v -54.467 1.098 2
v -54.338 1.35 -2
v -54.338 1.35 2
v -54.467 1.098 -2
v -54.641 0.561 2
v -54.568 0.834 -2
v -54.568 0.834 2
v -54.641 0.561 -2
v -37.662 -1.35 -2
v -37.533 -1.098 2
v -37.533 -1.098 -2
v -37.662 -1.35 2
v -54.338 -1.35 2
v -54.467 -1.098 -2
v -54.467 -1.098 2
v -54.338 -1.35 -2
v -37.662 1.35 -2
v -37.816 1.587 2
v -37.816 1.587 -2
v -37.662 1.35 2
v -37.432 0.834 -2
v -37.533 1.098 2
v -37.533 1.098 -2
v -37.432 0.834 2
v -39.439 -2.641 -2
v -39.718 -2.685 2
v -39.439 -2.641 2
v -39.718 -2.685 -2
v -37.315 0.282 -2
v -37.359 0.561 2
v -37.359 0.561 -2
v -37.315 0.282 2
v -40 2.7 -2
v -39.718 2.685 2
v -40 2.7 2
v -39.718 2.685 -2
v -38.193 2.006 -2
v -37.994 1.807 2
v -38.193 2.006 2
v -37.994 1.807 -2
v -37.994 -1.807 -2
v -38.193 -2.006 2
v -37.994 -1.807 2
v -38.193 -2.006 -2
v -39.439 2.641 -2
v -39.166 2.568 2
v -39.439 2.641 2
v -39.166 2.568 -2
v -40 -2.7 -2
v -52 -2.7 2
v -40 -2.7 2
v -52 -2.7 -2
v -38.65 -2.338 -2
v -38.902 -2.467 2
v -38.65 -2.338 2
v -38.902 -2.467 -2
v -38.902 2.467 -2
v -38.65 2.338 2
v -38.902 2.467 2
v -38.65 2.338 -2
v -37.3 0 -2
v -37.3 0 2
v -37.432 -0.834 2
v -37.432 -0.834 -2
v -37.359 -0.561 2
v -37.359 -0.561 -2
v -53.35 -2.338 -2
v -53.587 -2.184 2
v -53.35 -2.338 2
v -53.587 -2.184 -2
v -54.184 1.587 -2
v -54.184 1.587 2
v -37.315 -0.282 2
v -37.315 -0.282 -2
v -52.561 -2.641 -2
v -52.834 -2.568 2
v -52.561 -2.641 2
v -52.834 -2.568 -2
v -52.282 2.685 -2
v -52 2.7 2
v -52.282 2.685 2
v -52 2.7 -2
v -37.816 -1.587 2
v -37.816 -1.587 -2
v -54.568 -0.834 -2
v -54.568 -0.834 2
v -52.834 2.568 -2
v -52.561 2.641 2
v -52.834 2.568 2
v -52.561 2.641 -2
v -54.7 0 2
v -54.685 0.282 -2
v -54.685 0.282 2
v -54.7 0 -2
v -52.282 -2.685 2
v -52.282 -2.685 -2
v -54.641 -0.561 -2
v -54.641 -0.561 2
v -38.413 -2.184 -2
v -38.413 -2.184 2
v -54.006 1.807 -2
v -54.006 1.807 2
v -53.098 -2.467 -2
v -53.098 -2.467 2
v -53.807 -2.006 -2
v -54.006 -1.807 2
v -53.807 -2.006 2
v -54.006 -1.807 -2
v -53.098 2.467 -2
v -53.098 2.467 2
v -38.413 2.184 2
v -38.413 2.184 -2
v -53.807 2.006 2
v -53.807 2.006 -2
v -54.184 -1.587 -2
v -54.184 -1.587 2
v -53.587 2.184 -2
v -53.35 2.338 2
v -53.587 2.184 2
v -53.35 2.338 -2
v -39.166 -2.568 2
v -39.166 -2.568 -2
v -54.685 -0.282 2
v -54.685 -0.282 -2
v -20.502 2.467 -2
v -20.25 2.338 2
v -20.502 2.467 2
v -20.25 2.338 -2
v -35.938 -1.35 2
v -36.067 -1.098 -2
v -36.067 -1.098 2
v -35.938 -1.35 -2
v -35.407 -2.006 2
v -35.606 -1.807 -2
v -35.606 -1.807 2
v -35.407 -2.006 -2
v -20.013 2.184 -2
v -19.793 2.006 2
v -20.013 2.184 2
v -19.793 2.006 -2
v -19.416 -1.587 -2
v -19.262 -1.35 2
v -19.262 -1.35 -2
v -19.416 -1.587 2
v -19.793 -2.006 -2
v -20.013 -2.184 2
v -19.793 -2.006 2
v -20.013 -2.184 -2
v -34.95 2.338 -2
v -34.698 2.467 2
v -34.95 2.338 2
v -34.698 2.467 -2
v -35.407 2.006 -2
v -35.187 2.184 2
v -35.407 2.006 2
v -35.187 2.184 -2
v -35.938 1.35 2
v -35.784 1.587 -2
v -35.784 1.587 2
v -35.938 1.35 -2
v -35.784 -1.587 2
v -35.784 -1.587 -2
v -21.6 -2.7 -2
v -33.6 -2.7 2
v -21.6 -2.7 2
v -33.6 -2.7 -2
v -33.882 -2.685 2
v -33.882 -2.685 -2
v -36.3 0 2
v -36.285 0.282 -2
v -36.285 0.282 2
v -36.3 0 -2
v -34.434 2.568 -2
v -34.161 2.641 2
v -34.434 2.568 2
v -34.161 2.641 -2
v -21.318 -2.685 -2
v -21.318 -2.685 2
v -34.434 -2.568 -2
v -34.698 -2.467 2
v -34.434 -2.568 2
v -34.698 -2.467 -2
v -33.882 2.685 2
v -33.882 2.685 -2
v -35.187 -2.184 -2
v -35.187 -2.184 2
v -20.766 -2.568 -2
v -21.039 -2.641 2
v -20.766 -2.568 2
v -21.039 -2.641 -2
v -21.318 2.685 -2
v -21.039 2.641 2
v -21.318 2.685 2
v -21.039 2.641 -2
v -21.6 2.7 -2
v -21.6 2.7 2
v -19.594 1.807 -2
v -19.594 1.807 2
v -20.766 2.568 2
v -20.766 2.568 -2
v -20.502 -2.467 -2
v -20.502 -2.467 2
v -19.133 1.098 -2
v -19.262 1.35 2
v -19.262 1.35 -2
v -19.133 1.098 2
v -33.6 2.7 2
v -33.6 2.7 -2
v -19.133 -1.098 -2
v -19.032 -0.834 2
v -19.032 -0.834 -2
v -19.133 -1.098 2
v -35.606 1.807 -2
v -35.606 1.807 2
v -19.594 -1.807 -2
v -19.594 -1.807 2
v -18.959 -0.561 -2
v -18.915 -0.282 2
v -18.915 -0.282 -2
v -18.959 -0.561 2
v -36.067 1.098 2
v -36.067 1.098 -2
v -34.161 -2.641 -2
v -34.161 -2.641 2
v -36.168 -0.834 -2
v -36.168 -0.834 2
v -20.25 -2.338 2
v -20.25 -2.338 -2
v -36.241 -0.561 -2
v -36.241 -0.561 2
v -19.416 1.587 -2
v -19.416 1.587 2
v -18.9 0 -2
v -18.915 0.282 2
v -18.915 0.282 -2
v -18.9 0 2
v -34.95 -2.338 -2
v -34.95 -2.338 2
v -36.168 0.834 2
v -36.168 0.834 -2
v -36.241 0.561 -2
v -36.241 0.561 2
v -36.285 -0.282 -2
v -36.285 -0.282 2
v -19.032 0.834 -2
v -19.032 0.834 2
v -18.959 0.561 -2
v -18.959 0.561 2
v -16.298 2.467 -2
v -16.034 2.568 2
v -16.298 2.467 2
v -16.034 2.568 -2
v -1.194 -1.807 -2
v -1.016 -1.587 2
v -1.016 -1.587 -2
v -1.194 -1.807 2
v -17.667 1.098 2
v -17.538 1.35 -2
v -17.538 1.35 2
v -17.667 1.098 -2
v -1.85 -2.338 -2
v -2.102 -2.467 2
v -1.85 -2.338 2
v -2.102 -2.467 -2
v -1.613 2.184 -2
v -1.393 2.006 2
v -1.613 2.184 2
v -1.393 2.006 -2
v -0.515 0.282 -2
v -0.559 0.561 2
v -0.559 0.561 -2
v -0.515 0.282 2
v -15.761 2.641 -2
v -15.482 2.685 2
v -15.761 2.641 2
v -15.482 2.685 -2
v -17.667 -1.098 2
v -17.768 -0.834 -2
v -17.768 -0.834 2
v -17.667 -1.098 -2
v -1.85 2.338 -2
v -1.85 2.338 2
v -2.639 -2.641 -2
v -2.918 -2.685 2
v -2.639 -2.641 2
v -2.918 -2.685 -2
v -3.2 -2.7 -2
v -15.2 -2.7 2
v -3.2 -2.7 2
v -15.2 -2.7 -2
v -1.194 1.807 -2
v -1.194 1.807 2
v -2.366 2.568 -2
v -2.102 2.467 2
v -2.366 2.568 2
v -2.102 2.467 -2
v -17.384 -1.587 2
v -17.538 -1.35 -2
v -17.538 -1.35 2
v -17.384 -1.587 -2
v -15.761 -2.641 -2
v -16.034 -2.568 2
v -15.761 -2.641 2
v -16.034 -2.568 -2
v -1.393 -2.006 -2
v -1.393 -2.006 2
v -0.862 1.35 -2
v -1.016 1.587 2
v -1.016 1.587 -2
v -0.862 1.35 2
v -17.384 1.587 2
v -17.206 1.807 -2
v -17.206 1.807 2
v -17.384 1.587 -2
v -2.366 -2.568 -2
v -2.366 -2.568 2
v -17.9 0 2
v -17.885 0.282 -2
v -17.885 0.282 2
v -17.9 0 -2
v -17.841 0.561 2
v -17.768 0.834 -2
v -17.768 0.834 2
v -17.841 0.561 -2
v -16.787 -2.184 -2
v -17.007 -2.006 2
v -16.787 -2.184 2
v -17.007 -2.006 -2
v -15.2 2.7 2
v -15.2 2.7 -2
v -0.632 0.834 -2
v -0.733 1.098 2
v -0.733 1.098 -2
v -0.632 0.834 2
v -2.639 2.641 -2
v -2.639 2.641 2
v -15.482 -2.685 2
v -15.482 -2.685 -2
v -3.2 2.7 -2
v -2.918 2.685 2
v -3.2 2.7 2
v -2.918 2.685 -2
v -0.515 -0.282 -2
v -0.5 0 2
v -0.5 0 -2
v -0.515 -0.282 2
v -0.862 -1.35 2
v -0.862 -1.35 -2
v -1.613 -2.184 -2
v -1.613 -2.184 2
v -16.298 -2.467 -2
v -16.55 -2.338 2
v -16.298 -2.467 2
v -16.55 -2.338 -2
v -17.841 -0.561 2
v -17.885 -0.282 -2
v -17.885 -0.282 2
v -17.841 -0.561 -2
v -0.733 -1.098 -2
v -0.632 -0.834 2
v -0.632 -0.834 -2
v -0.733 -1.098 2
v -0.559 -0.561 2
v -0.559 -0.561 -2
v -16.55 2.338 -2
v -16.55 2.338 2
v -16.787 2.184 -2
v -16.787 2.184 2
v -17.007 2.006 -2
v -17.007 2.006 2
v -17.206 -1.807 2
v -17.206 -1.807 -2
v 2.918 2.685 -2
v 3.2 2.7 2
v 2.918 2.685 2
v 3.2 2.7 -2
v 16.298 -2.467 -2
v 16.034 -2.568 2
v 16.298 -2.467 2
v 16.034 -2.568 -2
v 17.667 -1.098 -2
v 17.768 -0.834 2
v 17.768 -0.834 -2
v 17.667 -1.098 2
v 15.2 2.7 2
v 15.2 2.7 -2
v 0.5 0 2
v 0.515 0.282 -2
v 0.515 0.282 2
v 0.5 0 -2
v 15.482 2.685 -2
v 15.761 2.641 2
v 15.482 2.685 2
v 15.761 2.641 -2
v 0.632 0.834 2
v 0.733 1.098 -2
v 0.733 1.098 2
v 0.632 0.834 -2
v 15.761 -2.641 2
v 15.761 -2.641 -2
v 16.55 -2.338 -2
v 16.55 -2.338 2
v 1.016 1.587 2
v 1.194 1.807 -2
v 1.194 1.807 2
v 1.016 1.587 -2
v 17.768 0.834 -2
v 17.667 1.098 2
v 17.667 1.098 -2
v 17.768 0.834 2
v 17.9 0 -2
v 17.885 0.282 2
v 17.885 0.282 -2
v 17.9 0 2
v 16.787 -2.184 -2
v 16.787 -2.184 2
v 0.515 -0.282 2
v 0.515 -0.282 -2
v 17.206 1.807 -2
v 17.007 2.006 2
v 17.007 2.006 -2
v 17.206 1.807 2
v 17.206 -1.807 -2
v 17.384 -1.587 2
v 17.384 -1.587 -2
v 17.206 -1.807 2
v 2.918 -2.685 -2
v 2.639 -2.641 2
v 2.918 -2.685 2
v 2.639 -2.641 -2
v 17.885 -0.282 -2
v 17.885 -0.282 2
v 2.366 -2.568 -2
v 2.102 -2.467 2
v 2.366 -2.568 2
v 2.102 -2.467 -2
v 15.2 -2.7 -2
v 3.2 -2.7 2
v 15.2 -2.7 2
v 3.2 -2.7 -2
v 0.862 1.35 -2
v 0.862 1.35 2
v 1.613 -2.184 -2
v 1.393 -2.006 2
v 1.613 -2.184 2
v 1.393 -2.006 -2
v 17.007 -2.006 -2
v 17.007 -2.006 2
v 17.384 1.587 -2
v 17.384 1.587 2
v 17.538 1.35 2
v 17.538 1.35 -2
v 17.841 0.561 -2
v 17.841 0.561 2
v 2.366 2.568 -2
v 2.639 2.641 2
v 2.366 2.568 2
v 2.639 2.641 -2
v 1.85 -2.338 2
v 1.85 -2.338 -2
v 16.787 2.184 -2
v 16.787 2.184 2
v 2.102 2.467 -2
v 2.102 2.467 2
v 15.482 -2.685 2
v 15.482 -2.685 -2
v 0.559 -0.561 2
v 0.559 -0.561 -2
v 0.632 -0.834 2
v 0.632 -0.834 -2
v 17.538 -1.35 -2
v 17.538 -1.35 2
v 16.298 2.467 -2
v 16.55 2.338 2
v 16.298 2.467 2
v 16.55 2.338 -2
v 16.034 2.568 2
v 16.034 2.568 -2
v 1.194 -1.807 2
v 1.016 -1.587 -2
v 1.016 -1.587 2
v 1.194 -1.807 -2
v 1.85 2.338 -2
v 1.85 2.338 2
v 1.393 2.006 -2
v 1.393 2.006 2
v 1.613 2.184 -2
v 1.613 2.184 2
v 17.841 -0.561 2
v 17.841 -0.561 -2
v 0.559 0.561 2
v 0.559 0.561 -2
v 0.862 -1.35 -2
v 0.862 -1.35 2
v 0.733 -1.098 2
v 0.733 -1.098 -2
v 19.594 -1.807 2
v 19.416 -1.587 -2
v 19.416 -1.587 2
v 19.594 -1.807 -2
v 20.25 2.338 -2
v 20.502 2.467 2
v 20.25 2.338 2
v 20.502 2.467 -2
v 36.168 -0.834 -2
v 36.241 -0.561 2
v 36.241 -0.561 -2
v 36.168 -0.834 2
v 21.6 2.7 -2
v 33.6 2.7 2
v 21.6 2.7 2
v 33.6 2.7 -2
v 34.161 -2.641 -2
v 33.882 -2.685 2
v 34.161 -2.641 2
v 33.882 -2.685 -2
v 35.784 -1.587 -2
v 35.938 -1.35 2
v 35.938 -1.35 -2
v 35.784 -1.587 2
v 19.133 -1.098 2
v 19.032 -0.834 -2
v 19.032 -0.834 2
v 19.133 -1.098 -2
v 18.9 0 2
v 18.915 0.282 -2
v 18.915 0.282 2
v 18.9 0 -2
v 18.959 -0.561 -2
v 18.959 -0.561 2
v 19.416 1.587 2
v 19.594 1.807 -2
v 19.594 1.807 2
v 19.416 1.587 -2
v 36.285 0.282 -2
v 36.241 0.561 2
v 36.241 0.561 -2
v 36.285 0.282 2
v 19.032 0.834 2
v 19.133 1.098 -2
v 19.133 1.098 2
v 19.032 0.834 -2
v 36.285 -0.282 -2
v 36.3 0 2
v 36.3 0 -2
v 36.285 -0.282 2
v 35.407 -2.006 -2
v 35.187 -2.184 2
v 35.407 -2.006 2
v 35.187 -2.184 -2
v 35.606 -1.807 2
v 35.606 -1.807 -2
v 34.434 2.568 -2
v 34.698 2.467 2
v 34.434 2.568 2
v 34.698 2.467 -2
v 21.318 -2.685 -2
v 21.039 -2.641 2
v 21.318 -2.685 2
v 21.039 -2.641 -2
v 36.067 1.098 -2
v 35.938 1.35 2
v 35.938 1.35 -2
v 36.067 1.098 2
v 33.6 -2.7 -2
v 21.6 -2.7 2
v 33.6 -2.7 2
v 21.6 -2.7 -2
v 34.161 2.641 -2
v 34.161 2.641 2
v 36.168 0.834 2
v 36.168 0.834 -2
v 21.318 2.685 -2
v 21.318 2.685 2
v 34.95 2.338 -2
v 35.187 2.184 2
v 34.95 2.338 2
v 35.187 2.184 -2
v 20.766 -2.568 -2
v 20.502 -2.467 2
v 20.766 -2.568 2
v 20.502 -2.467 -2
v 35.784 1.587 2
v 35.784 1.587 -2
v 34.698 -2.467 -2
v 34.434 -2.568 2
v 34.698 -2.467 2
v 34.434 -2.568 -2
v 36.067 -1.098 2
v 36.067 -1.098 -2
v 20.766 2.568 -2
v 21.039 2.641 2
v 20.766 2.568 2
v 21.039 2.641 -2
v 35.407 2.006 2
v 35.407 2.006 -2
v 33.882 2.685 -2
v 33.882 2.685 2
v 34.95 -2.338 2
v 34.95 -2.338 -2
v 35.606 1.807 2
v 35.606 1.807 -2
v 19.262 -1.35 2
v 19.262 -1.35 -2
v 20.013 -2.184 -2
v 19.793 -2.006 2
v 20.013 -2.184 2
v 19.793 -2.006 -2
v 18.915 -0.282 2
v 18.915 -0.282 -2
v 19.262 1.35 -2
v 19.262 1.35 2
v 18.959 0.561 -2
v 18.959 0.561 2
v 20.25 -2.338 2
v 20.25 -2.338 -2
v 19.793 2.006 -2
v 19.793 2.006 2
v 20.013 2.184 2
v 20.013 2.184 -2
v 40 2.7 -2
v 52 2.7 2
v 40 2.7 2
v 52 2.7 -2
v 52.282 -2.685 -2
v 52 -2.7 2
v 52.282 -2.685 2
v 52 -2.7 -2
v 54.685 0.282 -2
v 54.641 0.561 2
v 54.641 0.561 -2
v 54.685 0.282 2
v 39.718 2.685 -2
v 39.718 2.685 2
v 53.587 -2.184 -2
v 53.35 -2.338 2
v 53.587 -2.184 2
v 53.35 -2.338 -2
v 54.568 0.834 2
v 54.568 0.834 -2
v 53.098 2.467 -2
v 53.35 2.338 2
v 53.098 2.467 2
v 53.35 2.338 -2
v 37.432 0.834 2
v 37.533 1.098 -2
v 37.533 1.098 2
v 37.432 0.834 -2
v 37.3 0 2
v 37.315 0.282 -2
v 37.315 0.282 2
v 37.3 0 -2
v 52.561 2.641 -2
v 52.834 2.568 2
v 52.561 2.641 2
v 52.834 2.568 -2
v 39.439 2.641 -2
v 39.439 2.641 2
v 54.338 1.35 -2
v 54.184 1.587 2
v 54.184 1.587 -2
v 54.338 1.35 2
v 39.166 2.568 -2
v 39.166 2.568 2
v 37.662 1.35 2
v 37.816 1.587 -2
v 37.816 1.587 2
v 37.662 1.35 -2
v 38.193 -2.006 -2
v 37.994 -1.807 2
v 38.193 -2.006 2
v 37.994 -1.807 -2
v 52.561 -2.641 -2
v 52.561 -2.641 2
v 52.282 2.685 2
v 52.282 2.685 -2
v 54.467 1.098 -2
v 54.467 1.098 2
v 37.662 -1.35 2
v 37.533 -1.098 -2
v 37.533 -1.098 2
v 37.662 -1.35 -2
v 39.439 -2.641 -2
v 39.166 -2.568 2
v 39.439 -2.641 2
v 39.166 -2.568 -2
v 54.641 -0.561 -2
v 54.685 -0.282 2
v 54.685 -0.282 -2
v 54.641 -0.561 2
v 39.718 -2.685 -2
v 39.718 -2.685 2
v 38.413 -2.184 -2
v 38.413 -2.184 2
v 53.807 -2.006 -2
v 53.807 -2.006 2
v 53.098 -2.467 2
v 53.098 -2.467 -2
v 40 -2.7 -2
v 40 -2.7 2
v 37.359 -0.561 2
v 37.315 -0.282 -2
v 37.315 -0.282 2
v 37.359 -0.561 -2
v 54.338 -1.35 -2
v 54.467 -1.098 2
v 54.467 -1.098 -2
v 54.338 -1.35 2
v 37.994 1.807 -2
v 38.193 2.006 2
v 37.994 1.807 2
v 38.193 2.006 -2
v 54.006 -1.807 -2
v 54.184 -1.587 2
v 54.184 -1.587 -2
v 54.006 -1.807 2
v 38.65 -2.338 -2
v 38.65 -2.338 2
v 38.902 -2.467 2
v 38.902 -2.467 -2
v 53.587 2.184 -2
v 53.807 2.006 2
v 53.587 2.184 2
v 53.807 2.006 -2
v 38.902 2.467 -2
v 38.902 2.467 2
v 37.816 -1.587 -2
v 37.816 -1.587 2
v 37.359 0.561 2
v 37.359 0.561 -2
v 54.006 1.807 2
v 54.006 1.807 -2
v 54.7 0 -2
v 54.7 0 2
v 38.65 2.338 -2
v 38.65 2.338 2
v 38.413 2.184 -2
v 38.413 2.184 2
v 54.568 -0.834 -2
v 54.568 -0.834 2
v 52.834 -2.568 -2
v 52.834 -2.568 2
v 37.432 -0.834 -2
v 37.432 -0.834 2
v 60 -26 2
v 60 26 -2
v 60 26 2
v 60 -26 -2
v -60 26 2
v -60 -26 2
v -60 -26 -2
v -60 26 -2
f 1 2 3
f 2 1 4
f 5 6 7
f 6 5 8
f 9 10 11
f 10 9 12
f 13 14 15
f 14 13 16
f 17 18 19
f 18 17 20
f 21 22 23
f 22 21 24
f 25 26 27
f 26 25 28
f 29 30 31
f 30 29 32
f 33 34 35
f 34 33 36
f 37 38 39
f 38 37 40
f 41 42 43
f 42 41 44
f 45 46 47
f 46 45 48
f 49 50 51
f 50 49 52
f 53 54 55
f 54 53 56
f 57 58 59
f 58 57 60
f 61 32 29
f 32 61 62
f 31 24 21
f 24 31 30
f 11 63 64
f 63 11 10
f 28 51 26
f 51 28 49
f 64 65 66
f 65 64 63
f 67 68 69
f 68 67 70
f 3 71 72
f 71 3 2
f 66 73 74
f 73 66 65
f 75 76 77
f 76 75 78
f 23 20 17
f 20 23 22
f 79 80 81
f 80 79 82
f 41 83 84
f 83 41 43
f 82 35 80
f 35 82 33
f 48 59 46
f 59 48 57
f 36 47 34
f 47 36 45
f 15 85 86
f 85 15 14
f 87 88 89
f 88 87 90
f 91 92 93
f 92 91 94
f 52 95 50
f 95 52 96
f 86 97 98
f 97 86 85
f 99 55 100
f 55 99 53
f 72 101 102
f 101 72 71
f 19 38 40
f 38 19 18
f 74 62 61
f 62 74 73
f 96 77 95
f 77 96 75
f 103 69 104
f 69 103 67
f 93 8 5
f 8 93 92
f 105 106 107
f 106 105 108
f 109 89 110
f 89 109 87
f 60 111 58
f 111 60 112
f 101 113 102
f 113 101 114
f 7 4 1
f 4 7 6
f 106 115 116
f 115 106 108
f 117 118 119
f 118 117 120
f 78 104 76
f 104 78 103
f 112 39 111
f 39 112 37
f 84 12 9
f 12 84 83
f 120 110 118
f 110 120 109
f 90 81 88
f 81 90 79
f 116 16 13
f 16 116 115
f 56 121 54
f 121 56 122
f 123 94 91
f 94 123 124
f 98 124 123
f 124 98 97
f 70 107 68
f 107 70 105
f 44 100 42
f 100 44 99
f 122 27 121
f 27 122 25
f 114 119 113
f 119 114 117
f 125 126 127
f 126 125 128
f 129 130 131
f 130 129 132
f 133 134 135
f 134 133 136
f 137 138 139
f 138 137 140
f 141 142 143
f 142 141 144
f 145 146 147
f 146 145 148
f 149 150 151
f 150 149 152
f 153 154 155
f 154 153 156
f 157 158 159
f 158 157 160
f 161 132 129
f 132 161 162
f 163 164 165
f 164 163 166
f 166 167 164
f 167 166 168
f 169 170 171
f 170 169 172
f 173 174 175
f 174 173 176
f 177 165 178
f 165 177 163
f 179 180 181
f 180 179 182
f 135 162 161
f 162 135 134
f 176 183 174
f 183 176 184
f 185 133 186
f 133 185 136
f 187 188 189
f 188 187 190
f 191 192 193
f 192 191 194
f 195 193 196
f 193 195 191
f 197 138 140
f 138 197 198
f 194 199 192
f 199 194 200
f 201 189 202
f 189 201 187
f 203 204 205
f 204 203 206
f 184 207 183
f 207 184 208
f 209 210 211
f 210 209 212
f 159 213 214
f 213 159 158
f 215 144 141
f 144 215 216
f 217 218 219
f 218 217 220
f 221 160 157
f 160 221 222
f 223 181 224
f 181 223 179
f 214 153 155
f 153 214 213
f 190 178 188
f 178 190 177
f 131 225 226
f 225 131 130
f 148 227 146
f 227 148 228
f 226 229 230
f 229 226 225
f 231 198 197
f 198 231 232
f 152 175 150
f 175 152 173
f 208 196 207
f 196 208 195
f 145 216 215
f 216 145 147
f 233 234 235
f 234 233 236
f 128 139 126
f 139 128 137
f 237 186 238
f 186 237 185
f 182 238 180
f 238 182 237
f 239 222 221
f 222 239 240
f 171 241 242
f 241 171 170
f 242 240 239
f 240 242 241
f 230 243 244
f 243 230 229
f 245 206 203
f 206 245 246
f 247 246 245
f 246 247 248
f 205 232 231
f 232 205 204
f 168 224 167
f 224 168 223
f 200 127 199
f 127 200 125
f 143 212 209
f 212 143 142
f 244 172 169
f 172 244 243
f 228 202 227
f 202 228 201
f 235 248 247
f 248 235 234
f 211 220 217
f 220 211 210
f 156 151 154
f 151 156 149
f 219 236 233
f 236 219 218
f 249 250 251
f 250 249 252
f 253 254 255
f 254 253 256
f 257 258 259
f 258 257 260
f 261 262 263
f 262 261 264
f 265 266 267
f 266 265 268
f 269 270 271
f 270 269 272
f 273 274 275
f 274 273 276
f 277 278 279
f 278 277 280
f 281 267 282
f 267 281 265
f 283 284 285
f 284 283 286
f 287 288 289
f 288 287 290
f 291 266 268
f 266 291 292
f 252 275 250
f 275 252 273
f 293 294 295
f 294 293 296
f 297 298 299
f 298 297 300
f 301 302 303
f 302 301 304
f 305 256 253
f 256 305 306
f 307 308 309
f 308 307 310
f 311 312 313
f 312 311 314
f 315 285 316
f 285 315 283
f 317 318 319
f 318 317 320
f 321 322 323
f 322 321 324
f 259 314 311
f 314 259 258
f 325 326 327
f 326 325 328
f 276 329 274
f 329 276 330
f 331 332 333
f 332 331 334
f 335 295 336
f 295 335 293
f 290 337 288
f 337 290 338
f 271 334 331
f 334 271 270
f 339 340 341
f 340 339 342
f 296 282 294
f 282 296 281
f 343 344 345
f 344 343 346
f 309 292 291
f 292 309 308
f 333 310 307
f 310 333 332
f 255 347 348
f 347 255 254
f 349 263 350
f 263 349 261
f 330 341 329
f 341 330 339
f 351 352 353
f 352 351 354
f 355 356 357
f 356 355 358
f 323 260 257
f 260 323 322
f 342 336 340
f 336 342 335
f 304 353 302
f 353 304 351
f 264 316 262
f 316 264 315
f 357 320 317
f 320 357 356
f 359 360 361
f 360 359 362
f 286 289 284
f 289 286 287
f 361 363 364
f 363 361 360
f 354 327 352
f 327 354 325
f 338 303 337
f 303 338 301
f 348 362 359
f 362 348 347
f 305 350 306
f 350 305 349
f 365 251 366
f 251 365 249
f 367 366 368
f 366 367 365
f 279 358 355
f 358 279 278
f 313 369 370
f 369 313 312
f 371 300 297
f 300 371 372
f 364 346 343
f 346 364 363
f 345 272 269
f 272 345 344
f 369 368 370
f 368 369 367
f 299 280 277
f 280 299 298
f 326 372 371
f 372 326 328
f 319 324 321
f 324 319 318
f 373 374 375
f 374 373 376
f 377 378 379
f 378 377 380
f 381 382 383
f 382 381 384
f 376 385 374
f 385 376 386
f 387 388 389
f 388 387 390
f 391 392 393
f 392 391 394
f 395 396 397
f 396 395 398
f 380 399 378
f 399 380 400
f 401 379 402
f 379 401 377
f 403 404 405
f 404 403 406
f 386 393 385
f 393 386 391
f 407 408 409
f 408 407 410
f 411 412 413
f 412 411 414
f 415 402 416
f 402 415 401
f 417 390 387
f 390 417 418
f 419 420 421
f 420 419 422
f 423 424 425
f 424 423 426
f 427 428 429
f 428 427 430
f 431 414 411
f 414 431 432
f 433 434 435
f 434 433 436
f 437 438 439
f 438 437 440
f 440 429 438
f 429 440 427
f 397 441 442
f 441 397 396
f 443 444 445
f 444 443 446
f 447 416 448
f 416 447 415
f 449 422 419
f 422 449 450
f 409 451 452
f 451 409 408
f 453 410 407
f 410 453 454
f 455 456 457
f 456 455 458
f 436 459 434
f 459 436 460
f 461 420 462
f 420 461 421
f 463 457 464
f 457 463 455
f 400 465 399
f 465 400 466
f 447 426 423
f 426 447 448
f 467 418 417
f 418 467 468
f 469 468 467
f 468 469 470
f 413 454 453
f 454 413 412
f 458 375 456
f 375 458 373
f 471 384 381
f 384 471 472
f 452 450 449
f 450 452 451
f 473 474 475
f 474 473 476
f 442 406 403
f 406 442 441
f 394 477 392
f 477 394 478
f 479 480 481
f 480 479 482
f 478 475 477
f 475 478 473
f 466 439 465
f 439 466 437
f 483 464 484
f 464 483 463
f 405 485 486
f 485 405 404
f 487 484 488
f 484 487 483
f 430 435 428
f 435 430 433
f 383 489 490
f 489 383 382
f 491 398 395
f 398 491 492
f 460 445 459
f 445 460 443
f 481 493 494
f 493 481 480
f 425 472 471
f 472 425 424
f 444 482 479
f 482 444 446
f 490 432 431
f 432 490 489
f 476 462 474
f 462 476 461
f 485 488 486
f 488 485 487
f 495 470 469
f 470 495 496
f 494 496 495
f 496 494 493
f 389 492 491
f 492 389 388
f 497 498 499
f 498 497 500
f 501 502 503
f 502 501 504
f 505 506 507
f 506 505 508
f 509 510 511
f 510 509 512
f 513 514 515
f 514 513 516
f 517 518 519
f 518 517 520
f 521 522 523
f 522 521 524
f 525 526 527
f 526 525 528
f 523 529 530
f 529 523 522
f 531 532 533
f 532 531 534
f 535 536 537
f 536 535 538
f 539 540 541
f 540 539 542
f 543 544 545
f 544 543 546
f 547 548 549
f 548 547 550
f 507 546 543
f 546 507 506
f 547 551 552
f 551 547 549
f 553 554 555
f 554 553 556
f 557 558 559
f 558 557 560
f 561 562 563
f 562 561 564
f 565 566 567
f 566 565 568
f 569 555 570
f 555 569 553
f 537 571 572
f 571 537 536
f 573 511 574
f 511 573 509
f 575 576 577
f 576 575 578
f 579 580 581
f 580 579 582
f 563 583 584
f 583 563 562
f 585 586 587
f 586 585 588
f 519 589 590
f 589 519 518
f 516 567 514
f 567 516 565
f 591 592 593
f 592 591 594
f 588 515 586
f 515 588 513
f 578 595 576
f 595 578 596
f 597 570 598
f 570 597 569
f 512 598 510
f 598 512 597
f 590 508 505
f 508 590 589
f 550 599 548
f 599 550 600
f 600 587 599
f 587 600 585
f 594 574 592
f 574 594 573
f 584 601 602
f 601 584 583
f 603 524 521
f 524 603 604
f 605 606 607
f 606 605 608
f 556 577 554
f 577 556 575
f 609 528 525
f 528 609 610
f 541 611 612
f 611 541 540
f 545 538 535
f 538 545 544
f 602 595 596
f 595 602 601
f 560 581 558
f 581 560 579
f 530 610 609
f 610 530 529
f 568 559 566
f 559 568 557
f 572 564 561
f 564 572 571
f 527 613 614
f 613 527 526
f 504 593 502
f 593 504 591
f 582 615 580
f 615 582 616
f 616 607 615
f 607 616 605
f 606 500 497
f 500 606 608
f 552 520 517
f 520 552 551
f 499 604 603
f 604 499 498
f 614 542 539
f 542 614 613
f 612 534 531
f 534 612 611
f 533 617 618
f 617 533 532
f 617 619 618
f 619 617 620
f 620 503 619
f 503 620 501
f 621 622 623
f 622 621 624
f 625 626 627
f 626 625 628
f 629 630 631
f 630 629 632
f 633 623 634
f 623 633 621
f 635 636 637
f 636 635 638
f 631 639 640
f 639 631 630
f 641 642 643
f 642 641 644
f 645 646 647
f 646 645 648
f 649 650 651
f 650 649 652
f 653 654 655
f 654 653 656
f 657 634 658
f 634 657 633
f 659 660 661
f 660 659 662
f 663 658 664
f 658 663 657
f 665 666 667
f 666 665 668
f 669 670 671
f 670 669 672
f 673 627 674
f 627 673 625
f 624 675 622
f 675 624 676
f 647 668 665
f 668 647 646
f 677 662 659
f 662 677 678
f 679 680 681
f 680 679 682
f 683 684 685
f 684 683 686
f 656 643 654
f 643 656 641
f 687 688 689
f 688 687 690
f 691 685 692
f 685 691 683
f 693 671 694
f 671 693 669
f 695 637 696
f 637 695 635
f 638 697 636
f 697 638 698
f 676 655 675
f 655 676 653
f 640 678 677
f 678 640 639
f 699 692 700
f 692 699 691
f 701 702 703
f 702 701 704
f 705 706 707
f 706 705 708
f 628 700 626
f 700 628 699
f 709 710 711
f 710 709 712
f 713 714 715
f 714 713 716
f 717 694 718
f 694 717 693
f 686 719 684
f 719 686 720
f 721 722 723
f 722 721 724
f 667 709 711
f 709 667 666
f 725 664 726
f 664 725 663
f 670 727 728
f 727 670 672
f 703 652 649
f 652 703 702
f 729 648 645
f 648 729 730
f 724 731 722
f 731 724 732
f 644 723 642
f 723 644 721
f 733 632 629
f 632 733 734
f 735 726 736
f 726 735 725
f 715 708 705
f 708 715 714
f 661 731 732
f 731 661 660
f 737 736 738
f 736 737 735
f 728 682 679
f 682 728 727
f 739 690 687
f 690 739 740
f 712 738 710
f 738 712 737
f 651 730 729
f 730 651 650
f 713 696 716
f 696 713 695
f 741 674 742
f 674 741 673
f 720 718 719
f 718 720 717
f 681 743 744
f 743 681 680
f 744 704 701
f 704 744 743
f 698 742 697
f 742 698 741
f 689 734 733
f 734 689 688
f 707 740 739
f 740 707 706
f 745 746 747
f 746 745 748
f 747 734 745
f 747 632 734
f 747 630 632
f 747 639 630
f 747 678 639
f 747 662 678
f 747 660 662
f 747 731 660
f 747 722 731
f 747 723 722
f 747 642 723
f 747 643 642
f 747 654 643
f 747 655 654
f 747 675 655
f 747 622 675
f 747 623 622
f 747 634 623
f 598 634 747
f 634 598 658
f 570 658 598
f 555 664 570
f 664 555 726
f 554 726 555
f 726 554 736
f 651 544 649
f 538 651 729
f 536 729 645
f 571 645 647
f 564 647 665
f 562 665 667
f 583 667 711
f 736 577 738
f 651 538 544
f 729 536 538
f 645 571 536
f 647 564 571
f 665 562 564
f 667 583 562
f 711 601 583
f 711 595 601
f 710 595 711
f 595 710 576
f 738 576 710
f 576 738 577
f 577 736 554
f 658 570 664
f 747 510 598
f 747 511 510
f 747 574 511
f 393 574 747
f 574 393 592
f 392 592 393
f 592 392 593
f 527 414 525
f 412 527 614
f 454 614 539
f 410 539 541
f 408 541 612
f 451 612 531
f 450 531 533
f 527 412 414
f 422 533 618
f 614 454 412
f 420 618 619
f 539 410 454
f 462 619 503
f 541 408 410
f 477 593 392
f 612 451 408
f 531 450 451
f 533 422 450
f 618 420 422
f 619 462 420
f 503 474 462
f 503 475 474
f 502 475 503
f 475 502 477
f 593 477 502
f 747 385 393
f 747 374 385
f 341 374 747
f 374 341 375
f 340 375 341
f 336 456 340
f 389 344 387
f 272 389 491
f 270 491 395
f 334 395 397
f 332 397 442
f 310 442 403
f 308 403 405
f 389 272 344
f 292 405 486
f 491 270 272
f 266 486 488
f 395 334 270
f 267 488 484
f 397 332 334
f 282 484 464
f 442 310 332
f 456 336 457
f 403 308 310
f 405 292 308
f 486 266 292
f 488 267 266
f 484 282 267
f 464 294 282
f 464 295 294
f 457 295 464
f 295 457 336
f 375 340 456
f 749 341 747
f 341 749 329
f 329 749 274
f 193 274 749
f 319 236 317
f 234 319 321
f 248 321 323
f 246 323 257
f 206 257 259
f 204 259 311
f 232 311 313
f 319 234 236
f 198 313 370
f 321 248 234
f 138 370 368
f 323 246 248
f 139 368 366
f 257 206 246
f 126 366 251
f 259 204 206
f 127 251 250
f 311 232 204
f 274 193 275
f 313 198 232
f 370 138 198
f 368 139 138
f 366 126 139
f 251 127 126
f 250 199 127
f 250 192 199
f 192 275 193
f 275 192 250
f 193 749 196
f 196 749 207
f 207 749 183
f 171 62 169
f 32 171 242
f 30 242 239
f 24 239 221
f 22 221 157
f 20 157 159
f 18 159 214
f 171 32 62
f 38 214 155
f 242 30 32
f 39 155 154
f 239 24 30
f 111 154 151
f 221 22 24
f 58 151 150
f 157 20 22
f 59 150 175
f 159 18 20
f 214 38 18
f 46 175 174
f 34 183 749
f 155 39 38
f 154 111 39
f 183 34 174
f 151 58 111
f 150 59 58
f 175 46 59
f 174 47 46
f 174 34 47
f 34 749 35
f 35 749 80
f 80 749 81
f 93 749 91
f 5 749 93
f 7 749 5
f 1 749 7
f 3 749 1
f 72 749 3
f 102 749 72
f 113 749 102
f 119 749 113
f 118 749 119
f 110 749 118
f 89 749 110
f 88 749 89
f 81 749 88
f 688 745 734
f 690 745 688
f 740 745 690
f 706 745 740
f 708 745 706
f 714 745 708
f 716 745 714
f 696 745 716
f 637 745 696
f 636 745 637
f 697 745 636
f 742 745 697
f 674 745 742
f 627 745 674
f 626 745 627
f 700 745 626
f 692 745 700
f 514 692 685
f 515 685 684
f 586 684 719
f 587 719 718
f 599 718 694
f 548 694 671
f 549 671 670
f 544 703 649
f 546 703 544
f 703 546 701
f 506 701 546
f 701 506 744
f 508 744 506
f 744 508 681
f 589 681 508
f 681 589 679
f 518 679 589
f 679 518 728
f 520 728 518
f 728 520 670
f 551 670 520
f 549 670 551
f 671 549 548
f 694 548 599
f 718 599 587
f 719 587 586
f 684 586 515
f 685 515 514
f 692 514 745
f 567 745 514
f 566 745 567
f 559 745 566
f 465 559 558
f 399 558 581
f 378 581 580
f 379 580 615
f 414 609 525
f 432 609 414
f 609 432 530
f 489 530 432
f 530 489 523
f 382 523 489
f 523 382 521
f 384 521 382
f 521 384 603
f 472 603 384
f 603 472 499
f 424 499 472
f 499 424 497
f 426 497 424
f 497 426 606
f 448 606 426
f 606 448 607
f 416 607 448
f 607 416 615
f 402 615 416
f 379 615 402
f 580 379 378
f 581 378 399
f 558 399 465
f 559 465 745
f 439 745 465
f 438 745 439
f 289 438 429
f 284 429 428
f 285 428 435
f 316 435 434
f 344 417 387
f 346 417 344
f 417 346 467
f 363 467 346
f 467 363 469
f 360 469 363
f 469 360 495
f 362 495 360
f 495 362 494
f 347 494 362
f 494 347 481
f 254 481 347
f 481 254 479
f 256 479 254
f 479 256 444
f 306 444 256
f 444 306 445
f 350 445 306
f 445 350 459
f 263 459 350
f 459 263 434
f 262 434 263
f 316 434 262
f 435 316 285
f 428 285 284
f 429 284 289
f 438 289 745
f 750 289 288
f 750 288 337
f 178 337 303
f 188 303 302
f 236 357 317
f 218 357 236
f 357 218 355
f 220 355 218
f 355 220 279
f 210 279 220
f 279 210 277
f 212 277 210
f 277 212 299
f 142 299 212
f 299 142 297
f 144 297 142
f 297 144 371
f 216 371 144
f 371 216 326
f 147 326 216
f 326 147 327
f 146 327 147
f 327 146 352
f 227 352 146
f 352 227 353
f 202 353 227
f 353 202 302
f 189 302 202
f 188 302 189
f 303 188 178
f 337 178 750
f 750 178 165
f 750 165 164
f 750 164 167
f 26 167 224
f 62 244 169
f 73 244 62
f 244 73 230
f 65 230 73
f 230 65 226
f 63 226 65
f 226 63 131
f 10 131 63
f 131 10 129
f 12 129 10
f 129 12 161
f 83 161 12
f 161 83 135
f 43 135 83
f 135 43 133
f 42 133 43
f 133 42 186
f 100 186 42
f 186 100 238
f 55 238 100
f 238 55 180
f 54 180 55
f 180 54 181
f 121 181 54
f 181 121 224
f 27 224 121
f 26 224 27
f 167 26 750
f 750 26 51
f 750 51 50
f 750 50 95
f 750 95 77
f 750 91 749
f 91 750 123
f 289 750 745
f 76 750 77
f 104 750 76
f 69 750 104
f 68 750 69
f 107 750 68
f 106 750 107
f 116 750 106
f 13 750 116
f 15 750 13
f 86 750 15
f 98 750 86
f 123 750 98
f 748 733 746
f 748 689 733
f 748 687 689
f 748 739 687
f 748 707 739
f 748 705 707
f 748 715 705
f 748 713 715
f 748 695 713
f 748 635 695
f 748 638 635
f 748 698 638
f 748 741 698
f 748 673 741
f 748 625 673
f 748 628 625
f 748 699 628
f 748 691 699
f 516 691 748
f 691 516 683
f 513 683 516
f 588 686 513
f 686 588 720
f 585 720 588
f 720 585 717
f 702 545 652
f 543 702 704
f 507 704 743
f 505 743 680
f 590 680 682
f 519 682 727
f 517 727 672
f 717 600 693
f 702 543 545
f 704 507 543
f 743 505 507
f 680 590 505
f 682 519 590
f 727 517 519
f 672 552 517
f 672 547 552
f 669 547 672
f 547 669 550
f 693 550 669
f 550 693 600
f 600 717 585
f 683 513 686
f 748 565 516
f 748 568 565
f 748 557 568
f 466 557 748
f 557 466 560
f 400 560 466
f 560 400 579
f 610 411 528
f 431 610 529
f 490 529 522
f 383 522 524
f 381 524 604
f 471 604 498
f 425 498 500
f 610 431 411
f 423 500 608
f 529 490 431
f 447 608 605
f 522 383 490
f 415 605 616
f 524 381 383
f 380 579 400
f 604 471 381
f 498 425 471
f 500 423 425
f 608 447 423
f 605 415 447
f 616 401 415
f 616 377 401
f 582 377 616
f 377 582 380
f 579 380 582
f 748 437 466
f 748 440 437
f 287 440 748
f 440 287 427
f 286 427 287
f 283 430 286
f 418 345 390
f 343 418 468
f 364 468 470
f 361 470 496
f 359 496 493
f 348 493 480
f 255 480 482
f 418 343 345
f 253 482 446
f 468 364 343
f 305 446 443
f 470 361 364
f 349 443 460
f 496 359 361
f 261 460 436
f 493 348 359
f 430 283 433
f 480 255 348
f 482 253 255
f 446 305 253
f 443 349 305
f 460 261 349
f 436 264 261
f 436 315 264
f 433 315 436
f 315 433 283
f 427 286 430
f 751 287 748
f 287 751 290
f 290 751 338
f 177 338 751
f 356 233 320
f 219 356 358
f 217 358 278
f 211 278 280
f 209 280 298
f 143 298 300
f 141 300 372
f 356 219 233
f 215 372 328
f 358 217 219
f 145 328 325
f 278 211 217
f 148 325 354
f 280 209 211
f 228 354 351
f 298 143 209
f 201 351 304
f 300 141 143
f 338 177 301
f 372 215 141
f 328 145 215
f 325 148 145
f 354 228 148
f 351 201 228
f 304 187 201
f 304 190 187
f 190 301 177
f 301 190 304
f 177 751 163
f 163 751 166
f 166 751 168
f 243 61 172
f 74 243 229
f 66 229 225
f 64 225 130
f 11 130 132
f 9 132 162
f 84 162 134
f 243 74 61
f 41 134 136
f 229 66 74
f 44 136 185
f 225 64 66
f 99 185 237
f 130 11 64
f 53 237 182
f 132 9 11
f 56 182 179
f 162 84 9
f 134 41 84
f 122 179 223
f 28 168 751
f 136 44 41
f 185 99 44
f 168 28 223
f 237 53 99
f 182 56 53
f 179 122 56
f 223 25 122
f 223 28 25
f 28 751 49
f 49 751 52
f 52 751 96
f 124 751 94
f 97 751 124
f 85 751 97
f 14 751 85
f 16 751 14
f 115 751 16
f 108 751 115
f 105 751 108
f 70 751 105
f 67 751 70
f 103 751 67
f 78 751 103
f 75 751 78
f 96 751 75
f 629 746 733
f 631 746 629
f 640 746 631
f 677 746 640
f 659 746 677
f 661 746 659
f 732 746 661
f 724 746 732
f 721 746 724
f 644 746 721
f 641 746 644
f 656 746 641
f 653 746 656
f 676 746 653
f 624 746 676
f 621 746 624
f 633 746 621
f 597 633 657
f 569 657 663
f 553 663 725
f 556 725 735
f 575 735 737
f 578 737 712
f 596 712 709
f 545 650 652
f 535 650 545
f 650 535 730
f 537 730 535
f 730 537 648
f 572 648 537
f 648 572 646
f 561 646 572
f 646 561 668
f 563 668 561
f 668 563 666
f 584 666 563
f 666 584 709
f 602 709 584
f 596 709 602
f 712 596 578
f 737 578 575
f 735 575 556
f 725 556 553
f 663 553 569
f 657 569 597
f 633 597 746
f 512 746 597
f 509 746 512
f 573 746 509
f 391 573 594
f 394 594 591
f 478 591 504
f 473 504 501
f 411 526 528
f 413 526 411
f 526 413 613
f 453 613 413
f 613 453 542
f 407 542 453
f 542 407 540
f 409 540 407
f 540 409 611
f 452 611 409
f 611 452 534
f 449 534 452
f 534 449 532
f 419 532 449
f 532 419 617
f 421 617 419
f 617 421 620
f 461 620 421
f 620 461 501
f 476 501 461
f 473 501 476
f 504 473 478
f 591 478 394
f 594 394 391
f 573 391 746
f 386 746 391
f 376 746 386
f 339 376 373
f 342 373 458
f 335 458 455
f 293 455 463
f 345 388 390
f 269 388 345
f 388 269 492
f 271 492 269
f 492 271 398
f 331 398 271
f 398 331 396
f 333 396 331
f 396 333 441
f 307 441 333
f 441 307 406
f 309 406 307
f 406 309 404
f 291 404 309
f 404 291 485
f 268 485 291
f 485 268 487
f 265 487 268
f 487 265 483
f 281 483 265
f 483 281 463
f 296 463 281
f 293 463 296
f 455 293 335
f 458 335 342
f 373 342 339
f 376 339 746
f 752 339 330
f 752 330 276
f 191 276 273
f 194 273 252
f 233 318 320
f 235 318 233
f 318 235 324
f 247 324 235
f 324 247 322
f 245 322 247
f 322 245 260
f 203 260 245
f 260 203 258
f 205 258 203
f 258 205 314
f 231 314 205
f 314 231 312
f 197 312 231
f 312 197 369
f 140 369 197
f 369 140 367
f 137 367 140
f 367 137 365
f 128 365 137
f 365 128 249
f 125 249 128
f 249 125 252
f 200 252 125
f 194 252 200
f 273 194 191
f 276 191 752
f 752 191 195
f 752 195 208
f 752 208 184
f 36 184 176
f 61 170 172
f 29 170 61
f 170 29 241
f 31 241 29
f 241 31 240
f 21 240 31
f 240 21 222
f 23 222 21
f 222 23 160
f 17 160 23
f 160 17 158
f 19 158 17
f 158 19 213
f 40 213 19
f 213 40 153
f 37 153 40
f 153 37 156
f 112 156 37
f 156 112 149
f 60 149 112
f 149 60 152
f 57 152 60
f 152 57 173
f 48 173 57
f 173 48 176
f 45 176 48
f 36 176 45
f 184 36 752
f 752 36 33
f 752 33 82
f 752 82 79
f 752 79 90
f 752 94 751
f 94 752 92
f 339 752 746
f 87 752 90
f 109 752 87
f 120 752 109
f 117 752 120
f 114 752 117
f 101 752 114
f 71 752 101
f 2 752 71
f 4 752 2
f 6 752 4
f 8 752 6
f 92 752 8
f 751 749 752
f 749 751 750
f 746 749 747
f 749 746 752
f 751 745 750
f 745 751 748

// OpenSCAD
// Slotted mounting plate.
$fn = 60;
eps = 0.02;
plate_l = 120;
plate_w = 52;
plate_t = 4;
slot_l = 12;
slot_d = 5.4;
module slot(x) { hull() { translate([x-slot_l/2,0,-plate_t/2-eps]) cylinder(d=slot_d,h=plate_t+2*eps); translate([x+slot_l/2,0,-plate_t/2-eps]) cylinder(d=slot_d,h=plate_t+2*eps); } }
difference() { cube([plate_l, plate_w, plate_t], center=true); for (i=[0:5]) slot(-plate_l/2+14+i*(plate_l-28)/max(1,5)); }
